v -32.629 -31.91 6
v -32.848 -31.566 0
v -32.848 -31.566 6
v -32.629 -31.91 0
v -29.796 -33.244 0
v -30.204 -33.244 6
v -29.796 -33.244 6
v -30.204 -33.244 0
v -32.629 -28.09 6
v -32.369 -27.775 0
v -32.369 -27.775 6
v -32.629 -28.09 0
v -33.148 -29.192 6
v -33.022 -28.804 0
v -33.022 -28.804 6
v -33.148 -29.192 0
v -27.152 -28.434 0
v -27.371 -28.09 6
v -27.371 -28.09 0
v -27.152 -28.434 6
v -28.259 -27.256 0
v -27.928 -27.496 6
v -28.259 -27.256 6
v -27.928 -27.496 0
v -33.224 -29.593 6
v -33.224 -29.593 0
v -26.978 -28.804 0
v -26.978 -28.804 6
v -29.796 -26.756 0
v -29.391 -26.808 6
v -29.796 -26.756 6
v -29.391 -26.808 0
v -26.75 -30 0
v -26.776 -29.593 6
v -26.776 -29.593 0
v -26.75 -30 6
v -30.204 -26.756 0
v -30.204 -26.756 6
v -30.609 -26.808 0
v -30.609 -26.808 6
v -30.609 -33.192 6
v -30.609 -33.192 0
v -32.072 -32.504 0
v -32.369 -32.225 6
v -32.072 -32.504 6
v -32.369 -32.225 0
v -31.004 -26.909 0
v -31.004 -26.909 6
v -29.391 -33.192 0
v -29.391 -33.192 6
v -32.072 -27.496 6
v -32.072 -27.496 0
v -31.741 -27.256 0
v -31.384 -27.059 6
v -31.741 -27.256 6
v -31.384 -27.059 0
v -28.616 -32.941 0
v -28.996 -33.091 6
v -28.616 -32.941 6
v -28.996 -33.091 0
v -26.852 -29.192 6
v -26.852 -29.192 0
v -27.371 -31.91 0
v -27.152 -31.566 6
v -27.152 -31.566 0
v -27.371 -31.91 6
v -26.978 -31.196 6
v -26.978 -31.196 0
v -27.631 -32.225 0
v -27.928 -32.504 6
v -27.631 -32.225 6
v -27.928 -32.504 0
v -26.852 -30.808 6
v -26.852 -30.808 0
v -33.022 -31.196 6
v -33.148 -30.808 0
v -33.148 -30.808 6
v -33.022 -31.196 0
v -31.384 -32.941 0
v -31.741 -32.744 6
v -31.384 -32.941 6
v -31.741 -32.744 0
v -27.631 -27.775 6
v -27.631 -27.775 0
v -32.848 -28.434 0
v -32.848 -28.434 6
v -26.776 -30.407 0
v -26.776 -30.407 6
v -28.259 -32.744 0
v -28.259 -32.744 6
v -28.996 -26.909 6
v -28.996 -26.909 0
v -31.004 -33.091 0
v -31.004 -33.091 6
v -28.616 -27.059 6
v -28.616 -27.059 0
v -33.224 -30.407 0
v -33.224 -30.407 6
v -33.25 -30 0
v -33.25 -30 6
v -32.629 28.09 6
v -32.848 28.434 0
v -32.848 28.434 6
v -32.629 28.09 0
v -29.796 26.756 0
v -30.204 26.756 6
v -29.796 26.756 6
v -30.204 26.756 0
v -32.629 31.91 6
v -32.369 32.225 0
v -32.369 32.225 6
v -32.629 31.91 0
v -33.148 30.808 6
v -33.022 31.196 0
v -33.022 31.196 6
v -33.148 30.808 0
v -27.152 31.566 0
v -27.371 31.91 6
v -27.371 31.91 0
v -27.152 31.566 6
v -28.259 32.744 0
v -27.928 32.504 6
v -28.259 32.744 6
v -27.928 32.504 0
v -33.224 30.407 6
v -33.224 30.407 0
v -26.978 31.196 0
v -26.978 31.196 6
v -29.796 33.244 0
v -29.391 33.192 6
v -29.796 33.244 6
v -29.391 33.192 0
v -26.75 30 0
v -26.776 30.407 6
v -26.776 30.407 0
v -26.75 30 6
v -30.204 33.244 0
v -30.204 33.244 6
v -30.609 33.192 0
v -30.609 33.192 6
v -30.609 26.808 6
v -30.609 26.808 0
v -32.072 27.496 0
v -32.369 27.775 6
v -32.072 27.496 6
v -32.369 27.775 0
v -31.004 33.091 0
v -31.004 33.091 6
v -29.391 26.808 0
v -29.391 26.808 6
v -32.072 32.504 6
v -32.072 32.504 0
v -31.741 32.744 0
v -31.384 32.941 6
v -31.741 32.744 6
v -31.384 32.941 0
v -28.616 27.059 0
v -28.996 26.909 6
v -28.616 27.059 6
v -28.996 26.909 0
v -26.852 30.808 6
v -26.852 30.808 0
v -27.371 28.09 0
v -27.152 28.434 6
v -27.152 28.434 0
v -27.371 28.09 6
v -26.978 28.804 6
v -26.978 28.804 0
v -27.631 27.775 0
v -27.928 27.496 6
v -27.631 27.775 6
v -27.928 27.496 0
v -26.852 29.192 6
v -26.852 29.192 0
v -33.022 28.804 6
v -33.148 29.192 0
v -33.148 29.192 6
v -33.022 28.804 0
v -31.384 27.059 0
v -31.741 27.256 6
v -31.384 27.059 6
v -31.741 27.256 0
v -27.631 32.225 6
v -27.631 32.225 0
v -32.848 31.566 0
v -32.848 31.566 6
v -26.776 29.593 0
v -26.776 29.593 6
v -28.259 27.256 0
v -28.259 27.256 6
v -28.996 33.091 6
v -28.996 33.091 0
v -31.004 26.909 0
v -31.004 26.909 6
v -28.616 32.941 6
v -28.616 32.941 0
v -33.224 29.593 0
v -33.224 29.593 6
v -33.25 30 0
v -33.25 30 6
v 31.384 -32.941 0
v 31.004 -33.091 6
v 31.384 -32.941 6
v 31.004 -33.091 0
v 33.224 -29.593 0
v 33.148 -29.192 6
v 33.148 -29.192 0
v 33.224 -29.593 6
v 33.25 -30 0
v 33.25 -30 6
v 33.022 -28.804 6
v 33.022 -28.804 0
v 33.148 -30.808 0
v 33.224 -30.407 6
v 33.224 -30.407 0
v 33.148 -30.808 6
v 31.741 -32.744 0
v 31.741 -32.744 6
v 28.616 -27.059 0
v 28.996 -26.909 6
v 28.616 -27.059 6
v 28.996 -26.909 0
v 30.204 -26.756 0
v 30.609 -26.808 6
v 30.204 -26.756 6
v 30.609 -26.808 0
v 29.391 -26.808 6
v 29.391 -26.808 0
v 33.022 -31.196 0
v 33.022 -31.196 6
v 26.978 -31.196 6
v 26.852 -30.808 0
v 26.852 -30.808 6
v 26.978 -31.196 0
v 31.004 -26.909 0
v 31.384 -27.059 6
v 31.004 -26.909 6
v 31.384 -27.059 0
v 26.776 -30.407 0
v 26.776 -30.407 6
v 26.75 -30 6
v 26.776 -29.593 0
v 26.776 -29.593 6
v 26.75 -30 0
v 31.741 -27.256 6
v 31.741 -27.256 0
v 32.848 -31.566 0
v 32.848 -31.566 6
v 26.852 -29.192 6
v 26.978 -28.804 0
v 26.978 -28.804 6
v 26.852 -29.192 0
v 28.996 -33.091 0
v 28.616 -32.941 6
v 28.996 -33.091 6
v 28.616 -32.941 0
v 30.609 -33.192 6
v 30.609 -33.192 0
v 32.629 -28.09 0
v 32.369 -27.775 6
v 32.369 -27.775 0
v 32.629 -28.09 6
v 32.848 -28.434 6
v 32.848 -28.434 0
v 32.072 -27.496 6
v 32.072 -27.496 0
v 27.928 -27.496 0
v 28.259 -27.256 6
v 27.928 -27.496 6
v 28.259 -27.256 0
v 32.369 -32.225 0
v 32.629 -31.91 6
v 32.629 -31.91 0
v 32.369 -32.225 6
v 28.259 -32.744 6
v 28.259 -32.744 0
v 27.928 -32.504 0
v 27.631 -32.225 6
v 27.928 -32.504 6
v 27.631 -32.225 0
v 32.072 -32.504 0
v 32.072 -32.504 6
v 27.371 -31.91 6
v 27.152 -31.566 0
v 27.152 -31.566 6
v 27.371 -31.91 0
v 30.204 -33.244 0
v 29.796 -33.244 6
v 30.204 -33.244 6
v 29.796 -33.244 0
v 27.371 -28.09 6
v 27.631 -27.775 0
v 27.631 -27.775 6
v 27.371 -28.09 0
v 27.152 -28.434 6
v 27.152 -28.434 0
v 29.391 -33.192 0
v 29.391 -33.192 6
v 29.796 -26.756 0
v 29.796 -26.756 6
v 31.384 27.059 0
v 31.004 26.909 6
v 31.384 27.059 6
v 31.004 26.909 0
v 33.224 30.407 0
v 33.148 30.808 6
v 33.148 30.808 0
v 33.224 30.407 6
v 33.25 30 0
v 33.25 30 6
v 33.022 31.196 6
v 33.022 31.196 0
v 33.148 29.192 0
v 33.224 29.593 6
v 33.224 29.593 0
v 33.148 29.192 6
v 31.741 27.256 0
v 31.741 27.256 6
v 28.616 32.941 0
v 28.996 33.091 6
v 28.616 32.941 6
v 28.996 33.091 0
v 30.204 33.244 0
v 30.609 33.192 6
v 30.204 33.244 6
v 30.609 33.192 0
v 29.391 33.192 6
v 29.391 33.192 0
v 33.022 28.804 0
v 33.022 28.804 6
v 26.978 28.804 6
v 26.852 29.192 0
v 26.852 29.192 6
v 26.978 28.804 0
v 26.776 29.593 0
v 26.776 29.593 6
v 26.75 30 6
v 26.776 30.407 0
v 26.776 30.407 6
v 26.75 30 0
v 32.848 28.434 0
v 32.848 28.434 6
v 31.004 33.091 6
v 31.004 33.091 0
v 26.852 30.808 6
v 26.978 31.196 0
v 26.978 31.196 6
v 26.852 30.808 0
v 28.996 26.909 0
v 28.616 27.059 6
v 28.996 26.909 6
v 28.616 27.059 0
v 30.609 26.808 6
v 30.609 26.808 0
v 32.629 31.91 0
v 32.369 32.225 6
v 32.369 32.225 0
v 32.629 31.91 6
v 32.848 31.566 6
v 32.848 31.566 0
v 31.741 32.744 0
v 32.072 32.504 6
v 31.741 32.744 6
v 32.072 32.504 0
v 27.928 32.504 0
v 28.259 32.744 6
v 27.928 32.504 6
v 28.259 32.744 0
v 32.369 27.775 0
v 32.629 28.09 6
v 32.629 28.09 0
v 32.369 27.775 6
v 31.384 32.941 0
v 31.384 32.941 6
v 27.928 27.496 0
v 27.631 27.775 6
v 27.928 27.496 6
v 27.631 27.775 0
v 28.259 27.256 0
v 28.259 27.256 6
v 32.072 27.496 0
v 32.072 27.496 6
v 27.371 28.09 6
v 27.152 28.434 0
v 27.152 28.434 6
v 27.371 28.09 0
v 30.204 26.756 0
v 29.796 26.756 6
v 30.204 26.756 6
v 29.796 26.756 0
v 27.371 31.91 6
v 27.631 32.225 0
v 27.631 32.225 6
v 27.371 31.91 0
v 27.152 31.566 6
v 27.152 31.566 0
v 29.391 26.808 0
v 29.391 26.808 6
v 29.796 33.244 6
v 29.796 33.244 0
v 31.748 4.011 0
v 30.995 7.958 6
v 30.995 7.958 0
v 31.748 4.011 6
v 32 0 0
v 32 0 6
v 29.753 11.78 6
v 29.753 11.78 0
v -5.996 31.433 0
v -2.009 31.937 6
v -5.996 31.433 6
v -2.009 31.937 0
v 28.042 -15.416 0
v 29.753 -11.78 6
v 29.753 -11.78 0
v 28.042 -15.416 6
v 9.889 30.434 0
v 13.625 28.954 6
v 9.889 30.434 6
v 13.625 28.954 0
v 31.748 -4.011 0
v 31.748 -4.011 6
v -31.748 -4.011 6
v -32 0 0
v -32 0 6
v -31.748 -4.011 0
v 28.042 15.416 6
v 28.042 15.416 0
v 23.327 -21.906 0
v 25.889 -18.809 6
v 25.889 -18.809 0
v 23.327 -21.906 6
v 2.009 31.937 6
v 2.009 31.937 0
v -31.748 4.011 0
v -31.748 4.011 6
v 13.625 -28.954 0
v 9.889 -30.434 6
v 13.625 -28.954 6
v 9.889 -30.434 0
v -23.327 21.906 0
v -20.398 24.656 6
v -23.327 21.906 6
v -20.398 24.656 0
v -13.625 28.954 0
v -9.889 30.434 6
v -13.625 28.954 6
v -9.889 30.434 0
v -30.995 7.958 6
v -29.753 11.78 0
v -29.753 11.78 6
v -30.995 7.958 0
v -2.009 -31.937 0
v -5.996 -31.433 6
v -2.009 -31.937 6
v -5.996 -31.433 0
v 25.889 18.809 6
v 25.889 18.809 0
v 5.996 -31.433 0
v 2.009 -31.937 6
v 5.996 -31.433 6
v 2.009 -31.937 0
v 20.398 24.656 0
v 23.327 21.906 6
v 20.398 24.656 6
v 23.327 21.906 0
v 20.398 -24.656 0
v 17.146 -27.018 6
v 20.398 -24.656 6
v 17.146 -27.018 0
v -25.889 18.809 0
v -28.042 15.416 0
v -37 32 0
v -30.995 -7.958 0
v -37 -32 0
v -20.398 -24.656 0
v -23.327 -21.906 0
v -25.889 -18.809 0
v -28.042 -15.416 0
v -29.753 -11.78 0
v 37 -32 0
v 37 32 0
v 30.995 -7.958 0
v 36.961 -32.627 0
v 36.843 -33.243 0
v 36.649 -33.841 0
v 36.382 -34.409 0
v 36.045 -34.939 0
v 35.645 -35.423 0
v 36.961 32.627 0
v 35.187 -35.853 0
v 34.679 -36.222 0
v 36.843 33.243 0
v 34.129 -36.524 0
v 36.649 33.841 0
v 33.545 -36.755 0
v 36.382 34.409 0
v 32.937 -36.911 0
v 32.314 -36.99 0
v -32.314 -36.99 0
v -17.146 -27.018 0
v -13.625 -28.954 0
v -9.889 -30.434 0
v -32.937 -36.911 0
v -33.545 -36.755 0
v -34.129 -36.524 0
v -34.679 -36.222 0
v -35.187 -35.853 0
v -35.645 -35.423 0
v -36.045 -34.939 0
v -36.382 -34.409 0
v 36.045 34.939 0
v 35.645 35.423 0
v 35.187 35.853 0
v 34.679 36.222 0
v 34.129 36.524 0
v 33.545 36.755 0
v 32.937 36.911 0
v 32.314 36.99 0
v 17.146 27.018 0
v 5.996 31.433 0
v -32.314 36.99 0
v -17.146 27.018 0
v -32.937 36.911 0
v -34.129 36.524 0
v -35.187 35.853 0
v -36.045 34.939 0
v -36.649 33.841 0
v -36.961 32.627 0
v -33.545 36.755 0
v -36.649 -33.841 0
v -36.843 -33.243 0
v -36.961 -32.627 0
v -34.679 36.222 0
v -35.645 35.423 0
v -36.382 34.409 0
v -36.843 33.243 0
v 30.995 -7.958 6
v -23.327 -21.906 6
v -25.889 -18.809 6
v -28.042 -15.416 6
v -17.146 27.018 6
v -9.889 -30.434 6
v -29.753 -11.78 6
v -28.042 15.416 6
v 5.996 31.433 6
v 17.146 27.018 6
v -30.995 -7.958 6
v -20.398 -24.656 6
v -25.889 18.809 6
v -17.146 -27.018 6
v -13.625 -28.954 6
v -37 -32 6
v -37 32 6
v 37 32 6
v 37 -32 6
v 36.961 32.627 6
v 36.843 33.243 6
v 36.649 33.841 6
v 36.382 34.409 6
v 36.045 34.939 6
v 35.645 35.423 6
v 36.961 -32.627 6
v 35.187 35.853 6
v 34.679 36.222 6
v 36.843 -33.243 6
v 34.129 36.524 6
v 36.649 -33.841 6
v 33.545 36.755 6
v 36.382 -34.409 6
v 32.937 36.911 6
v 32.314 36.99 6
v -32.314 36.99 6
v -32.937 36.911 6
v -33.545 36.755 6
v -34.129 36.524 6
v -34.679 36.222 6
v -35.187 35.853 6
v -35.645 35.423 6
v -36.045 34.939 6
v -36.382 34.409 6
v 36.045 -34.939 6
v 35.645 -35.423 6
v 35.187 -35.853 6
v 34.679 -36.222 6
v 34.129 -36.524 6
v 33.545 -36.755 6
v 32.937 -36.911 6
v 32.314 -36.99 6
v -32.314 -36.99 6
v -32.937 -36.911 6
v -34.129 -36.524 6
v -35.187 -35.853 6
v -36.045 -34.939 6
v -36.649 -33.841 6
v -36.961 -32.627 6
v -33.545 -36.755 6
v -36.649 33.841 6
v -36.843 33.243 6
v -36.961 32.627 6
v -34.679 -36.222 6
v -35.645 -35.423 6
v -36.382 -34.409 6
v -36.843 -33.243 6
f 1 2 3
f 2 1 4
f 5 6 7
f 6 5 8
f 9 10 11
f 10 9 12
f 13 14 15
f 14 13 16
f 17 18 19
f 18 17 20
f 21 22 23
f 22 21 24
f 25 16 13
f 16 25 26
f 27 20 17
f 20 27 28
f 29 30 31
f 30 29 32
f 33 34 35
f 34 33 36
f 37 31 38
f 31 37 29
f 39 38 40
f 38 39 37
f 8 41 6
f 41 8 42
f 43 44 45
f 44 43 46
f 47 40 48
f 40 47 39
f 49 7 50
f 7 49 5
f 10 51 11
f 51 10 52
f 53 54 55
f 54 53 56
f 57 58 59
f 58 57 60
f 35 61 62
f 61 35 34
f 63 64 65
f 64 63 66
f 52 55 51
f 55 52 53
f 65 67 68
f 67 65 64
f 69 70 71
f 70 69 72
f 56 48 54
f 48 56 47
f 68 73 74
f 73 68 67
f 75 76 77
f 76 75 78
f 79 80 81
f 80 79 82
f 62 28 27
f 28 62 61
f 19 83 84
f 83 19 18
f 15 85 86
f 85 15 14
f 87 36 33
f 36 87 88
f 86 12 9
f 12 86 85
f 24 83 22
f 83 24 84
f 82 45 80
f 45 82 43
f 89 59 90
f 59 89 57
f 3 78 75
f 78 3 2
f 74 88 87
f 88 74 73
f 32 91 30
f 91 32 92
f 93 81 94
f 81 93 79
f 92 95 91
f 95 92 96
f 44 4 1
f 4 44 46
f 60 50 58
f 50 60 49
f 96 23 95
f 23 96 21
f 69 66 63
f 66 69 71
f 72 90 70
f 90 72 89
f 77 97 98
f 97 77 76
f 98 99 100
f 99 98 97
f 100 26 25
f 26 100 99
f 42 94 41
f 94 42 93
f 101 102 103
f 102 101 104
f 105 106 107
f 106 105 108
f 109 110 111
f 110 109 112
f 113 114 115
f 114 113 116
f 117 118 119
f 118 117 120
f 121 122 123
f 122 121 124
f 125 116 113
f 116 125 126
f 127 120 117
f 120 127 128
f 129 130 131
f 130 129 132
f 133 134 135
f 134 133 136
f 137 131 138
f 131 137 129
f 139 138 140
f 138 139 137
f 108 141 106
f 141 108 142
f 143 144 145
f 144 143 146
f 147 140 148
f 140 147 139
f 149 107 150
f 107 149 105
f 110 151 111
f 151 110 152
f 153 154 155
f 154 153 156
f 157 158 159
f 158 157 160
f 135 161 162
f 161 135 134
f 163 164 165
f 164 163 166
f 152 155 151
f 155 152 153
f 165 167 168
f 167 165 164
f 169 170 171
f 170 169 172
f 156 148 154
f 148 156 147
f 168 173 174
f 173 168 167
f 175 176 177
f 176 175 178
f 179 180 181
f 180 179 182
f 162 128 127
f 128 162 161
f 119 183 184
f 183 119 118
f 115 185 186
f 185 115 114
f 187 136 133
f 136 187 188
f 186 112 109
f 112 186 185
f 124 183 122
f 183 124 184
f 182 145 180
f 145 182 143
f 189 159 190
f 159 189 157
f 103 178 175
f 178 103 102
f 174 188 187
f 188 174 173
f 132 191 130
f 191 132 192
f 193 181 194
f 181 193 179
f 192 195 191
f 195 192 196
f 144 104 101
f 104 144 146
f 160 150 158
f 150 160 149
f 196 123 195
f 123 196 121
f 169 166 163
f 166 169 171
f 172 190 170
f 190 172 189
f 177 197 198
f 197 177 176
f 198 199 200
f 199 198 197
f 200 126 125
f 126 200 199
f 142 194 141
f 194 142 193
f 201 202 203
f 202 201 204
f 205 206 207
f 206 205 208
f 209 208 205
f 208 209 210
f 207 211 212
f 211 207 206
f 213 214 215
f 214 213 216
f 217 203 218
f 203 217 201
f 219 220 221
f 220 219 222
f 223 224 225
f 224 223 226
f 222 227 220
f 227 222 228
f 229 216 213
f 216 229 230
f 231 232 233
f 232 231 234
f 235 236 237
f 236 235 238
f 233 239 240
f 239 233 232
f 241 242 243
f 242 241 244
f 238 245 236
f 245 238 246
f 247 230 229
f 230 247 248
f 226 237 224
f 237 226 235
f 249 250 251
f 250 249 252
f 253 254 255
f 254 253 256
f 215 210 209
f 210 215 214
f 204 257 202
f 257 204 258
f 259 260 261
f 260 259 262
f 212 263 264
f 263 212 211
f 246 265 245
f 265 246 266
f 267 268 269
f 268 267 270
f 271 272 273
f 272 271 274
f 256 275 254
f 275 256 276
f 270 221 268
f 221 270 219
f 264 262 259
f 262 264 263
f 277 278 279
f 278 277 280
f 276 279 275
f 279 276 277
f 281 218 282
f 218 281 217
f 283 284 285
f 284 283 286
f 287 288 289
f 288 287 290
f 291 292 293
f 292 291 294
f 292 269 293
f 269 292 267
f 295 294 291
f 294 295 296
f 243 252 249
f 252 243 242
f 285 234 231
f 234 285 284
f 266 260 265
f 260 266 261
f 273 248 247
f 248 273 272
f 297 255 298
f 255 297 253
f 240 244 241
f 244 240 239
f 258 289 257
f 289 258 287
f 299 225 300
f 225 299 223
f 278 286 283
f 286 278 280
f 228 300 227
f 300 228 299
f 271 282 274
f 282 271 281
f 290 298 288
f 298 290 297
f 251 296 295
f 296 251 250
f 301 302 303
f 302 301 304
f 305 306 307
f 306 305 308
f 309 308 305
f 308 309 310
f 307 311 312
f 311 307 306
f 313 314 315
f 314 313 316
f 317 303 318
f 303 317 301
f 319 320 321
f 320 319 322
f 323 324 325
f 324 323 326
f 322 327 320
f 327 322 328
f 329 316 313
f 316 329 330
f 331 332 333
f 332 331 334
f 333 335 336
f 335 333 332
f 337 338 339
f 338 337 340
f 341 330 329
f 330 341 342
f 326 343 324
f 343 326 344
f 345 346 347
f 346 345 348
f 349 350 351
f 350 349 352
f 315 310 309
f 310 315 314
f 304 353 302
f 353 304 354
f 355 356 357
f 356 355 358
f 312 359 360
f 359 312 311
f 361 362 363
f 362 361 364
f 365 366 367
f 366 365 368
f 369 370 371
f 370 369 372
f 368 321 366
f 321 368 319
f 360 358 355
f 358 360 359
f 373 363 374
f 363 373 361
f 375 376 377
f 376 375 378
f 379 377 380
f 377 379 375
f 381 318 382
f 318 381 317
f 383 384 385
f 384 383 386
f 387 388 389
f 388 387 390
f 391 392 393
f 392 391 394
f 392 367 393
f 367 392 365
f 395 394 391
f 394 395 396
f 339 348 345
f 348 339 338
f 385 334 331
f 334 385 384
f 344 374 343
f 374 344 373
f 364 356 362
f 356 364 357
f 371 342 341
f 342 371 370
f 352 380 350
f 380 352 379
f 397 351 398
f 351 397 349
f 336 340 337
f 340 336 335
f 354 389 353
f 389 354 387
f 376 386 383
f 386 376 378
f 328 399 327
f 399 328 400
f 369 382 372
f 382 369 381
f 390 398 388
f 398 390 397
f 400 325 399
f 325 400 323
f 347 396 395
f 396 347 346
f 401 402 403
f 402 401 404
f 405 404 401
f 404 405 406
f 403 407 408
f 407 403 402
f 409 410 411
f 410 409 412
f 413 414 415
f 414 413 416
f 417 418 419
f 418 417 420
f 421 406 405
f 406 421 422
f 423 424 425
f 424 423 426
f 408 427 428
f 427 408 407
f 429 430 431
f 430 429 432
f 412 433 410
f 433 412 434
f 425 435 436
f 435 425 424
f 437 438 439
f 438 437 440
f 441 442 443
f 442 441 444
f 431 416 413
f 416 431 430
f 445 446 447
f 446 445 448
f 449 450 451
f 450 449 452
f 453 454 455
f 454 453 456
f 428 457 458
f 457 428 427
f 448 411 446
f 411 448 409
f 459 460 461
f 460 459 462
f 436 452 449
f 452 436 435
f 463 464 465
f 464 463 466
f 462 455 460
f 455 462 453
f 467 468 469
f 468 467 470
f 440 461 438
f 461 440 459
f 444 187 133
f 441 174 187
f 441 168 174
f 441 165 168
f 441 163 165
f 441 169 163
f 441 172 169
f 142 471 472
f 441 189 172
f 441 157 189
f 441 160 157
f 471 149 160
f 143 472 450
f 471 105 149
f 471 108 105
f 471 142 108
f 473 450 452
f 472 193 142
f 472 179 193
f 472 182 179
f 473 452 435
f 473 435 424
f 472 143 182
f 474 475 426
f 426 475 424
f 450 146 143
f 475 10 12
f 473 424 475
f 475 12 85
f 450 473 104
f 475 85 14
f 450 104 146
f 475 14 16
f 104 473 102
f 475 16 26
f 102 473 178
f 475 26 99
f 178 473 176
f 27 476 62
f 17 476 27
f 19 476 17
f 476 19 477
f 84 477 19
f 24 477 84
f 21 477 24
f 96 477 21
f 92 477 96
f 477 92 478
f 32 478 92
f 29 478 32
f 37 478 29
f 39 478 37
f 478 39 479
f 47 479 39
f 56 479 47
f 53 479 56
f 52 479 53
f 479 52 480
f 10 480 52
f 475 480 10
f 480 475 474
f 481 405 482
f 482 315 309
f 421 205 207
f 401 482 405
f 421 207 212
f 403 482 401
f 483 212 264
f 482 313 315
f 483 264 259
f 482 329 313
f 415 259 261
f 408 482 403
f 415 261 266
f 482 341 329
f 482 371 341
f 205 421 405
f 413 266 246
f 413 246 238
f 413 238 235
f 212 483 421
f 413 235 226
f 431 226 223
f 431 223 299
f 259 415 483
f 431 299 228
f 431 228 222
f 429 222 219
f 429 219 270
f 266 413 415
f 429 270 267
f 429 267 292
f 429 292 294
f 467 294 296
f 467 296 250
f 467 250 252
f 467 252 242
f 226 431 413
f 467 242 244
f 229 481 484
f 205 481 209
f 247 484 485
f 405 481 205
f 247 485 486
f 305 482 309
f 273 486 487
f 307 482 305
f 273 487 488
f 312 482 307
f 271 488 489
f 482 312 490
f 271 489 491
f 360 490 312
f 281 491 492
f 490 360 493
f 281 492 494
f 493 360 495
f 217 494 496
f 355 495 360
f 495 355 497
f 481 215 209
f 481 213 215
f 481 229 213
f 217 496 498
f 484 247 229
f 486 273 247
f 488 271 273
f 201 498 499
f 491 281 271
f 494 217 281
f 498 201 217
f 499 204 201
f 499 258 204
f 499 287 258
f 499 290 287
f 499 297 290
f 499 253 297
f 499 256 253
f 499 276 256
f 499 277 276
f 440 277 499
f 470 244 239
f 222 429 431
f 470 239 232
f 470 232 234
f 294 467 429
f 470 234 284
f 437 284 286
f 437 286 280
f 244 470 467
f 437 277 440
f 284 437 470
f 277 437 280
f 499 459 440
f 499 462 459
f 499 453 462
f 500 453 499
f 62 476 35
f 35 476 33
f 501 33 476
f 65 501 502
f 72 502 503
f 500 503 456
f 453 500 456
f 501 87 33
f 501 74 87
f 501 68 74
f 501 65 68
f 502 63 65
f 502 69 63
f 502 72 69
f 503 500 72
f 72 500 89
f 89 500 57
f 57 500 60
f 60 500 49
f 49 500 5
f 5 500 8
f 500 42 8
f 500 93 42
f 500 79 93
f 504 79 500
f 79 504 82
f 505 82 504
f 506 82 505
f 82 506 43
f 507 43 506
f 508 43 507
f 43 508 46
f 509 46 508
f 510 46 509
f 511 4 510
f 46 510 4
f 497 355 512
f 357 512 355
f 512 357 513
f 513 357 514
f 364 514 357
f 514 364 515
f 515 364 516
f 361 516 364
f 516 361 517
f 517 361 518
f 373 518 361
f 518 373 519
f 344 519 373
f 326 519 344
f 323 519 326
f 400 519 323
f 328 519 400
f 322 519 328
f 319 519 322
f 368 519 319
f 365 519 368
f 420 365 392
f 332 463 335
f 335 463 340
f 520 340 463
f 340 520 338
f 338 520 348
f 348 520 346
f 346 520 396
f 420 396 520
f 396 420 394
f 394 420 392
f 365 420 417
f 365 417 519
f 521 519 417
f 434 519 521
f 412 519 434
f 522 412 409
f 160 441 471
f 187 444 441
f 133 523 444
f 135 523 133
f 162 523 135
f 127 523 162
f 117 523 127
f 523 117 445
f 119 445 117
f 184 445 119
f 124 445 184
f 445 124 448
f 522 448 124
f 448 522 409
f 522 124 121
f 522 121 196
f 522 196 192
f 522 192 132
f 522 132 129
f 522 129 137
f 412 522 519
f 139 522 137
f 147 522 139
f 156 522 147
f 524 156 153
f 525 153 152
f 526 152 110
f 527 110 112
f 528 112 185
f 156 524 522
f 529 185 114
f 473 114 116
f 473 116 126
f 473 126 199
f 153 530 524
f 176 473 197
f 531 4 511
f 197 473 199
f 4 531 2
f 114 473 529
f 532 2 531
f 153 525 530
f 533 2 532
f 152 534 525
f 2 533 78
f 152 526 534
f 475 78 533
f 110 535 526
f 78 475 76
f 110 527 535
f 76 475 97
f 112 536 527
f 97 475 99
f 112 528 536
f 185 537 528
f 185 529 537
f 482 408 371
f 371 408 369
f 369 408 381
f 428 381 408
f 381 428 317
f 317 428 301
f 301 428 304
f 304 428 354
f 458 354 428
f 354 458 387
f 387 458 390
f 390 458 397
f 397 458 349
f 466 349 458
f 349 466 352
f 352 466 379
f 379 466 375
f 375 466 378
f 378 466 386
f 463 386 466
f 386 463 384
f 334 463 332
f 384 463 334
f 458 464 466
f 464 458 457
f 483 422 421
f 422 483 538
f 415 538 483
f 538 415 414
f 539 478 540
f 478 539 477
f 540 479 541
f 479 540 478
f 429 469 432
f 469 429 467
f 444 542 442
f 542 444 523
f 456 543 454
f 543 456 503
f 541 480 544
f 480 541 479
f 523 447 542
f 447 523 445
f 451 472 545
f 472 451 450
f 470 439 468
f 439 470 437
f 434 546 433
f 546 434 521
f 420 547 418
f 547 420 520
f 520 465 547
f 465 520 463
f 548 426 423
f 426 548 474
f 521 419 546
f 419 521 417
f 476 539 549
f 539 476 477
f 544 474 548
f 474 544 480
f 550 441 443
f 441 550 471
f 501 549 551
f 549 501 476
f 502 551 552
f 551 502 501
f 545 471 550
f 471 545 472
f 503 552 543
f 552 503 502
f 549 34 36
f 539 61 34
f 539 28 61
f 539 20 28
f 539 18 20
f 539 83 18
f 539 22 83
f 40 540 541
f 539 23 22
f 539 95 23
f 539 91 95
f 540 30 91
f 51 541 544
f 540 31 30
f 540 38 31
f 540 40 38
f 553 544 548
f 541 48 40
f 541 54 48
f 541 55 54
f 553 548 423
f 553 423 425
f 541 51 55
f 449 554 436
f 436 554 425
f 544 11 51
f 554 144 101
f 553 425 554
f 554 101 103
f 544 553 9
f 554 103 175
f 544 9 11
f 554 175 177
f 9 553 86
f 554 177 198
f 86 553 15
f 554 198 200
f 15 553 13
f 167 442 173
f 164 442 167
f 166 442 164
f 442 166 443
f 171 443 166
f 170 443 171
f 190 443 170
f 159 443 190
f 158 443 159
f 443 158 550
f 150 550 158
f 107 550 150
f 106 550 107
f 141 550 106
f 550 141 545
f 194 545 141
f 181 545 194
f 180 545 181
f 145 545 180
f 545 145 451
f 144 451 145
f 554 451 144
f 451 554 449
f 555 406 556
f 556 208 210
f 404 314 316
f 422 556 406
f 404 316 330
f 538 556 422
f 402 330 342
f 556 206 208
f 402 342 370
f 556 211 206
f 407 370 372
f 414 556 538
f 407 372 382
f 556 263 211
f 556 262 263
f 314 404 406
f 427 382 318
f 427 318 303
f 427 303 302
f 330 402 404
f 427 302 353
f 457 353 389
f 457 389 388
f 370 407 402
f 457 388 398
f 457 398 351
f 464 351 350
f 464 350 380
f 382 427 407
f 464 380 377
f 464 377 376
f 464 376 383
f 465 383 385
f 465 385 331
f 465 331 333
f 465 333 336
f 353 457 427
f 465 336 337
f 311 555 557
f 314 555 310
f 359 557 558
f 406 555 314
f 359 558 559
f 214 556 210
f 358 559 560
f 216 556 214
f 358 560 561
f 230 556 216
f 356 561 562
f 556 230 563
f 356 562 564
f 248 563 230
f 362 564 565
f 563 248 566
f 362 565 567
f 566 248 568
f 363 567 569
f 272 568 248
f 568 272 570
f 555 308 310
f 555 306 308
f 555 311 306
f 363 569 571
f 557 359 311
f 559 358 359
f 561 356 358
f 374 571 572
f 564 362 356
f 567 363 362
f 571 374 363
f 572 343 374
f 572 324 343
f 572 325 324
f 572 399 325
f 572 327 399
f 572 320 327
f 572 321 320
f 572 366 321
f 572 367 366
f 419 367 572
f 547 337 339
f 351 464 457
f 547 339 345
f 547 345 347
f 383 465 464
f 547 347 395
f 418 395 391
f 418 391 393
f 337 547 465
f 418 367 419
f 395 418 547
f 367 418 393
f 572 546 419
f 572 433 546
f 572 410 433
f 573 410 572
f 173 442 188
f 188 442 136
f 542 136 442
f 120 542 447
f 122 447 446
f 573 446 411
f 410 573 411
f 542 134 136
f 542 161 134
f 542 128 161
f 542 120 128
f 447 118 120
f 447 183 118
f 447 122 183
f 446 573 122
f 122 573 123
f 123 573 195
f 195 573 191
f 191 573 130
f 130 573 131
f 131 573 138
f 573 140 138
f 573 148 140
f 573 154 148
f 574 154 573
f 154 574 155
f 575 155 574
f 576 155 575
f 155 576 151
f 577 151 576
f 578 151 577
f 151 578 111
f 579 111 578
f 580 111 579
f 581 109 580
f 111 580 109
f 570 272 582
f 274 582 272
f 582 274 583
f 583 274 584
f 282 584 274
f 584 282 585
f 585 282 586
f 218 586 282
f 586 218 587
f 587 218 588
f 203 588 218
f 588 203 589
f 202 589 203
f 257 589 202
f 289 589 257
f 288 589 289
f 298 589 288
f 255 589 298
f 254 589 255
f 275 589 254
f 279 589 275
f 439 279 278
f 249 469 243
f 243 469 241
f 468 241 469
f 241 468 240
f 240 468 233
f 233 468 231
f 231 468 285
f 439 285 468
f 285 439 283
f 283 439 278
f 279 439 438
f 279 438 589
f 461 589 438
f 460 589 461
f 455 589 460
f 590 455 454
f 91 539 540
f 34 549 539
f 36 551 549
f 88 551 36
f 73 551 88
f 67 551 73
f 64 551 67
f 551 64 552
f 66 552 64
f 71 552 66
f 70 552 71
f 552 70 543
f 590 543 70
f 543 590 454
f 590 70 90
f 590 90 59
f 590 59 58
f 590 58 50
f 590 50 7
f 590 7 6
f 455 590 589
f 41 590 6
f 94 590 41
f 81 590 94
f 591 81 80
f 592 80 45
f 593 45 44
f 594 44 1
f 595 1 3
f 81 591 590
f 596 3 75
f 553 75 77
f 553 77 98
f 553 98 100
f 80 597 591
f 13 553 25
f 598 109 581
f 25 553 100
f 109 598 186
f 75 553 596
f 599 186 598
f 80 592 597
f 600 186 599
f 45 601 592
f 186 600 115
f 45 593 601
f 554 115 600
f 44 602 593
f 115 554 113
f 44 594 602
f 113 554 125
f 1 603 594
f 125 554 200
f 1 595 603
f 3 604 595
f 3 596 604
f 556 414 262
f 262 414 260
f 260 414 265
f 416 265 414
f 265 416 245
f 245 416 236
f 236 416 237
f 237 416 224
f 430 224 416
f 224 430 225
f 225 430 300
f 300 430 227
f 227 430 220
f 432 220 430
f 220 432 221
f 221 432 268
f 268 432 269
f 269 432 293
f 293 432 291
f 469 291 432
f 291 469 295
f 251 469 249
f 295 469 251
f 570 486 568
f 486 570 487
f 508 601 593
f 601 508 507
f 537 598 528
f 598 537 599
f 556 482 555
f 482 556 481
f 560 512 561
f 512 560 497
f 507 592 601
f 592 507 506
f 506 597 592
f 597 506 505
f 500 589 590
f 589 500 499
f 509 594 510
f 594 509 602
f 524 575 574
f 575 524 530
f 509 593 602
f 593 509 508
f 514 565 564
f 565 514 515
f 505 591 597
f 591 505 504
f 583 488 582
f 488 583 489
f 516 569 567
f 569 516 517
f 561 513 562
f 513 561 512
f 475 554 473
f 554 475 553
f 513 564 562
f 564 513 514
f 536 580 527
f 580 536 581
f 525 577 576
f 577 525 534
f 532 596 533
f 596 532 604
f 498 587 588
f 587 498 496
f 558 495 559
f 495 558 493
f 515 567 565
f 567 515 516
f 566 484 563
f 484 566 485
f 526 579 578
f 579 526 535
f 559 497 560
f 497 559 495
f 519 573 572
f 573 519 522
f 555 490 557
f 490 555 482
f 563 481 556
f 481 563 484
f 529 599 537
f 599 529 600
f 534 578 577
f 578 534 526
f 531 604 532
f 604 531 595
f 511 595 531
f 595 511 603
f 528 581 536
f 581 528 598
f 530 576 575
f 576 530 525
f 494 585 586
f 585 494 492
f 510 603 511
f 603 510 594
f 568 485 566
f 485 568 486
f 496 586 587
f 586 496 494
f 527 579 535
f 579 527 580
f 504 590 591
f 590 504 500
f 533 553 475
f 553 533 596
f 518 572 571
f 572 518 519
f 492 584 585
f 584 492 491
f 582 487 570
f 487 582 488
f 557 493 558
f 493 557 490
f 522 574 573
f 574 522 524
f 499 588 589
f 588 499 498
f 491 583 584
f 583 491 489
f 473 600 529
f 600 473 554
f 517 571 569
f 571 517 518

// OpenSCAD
$fn = 50;


difference() {
	union() {
		hull() {
			translate(v = [-32.0000000000, 32.0000000000, 0]) {
				cylinder(h = 6, r = 5);
			}
			translate(v = [32.0000000000, 32.0000000000, 0]) {
				cylinder(h = 6, r = 5);
			}
			translate(v = [-32.0000000000, -32.0000000000, 0]) {
				cylinder(h = 6, r = 5);
			}
			translate(v = [32.0000000000, -32.0000000000, 0]) {
				cylinder(h = 6, r = 5);
			}
		}
	}
	union() {
		#translate(v = [-30.0000000000, -30.0000000000, -100.0000000000]) {
			cylinder(h = 200, r = 3.2500000000);
		}
		#translate(v = [-30.0000000000, 30.0000000000, -100.0000000000]) {
			cylinder(h = 200, r = 3.2500000000);
		}
		#translate(v = [30.0000000000, -30.0000000000, -100.0000000000]) {
			cylinder(h = 200, r = 3.2500000000);
		}
		#translate(v = [30.0000000000, 30.0000000000, -100.0000000000]) {
			cylinder(h = 200, r = 3.2500000000);
		}
		#cylinder(h = 6, r = 32.0000000000);
	}
}
